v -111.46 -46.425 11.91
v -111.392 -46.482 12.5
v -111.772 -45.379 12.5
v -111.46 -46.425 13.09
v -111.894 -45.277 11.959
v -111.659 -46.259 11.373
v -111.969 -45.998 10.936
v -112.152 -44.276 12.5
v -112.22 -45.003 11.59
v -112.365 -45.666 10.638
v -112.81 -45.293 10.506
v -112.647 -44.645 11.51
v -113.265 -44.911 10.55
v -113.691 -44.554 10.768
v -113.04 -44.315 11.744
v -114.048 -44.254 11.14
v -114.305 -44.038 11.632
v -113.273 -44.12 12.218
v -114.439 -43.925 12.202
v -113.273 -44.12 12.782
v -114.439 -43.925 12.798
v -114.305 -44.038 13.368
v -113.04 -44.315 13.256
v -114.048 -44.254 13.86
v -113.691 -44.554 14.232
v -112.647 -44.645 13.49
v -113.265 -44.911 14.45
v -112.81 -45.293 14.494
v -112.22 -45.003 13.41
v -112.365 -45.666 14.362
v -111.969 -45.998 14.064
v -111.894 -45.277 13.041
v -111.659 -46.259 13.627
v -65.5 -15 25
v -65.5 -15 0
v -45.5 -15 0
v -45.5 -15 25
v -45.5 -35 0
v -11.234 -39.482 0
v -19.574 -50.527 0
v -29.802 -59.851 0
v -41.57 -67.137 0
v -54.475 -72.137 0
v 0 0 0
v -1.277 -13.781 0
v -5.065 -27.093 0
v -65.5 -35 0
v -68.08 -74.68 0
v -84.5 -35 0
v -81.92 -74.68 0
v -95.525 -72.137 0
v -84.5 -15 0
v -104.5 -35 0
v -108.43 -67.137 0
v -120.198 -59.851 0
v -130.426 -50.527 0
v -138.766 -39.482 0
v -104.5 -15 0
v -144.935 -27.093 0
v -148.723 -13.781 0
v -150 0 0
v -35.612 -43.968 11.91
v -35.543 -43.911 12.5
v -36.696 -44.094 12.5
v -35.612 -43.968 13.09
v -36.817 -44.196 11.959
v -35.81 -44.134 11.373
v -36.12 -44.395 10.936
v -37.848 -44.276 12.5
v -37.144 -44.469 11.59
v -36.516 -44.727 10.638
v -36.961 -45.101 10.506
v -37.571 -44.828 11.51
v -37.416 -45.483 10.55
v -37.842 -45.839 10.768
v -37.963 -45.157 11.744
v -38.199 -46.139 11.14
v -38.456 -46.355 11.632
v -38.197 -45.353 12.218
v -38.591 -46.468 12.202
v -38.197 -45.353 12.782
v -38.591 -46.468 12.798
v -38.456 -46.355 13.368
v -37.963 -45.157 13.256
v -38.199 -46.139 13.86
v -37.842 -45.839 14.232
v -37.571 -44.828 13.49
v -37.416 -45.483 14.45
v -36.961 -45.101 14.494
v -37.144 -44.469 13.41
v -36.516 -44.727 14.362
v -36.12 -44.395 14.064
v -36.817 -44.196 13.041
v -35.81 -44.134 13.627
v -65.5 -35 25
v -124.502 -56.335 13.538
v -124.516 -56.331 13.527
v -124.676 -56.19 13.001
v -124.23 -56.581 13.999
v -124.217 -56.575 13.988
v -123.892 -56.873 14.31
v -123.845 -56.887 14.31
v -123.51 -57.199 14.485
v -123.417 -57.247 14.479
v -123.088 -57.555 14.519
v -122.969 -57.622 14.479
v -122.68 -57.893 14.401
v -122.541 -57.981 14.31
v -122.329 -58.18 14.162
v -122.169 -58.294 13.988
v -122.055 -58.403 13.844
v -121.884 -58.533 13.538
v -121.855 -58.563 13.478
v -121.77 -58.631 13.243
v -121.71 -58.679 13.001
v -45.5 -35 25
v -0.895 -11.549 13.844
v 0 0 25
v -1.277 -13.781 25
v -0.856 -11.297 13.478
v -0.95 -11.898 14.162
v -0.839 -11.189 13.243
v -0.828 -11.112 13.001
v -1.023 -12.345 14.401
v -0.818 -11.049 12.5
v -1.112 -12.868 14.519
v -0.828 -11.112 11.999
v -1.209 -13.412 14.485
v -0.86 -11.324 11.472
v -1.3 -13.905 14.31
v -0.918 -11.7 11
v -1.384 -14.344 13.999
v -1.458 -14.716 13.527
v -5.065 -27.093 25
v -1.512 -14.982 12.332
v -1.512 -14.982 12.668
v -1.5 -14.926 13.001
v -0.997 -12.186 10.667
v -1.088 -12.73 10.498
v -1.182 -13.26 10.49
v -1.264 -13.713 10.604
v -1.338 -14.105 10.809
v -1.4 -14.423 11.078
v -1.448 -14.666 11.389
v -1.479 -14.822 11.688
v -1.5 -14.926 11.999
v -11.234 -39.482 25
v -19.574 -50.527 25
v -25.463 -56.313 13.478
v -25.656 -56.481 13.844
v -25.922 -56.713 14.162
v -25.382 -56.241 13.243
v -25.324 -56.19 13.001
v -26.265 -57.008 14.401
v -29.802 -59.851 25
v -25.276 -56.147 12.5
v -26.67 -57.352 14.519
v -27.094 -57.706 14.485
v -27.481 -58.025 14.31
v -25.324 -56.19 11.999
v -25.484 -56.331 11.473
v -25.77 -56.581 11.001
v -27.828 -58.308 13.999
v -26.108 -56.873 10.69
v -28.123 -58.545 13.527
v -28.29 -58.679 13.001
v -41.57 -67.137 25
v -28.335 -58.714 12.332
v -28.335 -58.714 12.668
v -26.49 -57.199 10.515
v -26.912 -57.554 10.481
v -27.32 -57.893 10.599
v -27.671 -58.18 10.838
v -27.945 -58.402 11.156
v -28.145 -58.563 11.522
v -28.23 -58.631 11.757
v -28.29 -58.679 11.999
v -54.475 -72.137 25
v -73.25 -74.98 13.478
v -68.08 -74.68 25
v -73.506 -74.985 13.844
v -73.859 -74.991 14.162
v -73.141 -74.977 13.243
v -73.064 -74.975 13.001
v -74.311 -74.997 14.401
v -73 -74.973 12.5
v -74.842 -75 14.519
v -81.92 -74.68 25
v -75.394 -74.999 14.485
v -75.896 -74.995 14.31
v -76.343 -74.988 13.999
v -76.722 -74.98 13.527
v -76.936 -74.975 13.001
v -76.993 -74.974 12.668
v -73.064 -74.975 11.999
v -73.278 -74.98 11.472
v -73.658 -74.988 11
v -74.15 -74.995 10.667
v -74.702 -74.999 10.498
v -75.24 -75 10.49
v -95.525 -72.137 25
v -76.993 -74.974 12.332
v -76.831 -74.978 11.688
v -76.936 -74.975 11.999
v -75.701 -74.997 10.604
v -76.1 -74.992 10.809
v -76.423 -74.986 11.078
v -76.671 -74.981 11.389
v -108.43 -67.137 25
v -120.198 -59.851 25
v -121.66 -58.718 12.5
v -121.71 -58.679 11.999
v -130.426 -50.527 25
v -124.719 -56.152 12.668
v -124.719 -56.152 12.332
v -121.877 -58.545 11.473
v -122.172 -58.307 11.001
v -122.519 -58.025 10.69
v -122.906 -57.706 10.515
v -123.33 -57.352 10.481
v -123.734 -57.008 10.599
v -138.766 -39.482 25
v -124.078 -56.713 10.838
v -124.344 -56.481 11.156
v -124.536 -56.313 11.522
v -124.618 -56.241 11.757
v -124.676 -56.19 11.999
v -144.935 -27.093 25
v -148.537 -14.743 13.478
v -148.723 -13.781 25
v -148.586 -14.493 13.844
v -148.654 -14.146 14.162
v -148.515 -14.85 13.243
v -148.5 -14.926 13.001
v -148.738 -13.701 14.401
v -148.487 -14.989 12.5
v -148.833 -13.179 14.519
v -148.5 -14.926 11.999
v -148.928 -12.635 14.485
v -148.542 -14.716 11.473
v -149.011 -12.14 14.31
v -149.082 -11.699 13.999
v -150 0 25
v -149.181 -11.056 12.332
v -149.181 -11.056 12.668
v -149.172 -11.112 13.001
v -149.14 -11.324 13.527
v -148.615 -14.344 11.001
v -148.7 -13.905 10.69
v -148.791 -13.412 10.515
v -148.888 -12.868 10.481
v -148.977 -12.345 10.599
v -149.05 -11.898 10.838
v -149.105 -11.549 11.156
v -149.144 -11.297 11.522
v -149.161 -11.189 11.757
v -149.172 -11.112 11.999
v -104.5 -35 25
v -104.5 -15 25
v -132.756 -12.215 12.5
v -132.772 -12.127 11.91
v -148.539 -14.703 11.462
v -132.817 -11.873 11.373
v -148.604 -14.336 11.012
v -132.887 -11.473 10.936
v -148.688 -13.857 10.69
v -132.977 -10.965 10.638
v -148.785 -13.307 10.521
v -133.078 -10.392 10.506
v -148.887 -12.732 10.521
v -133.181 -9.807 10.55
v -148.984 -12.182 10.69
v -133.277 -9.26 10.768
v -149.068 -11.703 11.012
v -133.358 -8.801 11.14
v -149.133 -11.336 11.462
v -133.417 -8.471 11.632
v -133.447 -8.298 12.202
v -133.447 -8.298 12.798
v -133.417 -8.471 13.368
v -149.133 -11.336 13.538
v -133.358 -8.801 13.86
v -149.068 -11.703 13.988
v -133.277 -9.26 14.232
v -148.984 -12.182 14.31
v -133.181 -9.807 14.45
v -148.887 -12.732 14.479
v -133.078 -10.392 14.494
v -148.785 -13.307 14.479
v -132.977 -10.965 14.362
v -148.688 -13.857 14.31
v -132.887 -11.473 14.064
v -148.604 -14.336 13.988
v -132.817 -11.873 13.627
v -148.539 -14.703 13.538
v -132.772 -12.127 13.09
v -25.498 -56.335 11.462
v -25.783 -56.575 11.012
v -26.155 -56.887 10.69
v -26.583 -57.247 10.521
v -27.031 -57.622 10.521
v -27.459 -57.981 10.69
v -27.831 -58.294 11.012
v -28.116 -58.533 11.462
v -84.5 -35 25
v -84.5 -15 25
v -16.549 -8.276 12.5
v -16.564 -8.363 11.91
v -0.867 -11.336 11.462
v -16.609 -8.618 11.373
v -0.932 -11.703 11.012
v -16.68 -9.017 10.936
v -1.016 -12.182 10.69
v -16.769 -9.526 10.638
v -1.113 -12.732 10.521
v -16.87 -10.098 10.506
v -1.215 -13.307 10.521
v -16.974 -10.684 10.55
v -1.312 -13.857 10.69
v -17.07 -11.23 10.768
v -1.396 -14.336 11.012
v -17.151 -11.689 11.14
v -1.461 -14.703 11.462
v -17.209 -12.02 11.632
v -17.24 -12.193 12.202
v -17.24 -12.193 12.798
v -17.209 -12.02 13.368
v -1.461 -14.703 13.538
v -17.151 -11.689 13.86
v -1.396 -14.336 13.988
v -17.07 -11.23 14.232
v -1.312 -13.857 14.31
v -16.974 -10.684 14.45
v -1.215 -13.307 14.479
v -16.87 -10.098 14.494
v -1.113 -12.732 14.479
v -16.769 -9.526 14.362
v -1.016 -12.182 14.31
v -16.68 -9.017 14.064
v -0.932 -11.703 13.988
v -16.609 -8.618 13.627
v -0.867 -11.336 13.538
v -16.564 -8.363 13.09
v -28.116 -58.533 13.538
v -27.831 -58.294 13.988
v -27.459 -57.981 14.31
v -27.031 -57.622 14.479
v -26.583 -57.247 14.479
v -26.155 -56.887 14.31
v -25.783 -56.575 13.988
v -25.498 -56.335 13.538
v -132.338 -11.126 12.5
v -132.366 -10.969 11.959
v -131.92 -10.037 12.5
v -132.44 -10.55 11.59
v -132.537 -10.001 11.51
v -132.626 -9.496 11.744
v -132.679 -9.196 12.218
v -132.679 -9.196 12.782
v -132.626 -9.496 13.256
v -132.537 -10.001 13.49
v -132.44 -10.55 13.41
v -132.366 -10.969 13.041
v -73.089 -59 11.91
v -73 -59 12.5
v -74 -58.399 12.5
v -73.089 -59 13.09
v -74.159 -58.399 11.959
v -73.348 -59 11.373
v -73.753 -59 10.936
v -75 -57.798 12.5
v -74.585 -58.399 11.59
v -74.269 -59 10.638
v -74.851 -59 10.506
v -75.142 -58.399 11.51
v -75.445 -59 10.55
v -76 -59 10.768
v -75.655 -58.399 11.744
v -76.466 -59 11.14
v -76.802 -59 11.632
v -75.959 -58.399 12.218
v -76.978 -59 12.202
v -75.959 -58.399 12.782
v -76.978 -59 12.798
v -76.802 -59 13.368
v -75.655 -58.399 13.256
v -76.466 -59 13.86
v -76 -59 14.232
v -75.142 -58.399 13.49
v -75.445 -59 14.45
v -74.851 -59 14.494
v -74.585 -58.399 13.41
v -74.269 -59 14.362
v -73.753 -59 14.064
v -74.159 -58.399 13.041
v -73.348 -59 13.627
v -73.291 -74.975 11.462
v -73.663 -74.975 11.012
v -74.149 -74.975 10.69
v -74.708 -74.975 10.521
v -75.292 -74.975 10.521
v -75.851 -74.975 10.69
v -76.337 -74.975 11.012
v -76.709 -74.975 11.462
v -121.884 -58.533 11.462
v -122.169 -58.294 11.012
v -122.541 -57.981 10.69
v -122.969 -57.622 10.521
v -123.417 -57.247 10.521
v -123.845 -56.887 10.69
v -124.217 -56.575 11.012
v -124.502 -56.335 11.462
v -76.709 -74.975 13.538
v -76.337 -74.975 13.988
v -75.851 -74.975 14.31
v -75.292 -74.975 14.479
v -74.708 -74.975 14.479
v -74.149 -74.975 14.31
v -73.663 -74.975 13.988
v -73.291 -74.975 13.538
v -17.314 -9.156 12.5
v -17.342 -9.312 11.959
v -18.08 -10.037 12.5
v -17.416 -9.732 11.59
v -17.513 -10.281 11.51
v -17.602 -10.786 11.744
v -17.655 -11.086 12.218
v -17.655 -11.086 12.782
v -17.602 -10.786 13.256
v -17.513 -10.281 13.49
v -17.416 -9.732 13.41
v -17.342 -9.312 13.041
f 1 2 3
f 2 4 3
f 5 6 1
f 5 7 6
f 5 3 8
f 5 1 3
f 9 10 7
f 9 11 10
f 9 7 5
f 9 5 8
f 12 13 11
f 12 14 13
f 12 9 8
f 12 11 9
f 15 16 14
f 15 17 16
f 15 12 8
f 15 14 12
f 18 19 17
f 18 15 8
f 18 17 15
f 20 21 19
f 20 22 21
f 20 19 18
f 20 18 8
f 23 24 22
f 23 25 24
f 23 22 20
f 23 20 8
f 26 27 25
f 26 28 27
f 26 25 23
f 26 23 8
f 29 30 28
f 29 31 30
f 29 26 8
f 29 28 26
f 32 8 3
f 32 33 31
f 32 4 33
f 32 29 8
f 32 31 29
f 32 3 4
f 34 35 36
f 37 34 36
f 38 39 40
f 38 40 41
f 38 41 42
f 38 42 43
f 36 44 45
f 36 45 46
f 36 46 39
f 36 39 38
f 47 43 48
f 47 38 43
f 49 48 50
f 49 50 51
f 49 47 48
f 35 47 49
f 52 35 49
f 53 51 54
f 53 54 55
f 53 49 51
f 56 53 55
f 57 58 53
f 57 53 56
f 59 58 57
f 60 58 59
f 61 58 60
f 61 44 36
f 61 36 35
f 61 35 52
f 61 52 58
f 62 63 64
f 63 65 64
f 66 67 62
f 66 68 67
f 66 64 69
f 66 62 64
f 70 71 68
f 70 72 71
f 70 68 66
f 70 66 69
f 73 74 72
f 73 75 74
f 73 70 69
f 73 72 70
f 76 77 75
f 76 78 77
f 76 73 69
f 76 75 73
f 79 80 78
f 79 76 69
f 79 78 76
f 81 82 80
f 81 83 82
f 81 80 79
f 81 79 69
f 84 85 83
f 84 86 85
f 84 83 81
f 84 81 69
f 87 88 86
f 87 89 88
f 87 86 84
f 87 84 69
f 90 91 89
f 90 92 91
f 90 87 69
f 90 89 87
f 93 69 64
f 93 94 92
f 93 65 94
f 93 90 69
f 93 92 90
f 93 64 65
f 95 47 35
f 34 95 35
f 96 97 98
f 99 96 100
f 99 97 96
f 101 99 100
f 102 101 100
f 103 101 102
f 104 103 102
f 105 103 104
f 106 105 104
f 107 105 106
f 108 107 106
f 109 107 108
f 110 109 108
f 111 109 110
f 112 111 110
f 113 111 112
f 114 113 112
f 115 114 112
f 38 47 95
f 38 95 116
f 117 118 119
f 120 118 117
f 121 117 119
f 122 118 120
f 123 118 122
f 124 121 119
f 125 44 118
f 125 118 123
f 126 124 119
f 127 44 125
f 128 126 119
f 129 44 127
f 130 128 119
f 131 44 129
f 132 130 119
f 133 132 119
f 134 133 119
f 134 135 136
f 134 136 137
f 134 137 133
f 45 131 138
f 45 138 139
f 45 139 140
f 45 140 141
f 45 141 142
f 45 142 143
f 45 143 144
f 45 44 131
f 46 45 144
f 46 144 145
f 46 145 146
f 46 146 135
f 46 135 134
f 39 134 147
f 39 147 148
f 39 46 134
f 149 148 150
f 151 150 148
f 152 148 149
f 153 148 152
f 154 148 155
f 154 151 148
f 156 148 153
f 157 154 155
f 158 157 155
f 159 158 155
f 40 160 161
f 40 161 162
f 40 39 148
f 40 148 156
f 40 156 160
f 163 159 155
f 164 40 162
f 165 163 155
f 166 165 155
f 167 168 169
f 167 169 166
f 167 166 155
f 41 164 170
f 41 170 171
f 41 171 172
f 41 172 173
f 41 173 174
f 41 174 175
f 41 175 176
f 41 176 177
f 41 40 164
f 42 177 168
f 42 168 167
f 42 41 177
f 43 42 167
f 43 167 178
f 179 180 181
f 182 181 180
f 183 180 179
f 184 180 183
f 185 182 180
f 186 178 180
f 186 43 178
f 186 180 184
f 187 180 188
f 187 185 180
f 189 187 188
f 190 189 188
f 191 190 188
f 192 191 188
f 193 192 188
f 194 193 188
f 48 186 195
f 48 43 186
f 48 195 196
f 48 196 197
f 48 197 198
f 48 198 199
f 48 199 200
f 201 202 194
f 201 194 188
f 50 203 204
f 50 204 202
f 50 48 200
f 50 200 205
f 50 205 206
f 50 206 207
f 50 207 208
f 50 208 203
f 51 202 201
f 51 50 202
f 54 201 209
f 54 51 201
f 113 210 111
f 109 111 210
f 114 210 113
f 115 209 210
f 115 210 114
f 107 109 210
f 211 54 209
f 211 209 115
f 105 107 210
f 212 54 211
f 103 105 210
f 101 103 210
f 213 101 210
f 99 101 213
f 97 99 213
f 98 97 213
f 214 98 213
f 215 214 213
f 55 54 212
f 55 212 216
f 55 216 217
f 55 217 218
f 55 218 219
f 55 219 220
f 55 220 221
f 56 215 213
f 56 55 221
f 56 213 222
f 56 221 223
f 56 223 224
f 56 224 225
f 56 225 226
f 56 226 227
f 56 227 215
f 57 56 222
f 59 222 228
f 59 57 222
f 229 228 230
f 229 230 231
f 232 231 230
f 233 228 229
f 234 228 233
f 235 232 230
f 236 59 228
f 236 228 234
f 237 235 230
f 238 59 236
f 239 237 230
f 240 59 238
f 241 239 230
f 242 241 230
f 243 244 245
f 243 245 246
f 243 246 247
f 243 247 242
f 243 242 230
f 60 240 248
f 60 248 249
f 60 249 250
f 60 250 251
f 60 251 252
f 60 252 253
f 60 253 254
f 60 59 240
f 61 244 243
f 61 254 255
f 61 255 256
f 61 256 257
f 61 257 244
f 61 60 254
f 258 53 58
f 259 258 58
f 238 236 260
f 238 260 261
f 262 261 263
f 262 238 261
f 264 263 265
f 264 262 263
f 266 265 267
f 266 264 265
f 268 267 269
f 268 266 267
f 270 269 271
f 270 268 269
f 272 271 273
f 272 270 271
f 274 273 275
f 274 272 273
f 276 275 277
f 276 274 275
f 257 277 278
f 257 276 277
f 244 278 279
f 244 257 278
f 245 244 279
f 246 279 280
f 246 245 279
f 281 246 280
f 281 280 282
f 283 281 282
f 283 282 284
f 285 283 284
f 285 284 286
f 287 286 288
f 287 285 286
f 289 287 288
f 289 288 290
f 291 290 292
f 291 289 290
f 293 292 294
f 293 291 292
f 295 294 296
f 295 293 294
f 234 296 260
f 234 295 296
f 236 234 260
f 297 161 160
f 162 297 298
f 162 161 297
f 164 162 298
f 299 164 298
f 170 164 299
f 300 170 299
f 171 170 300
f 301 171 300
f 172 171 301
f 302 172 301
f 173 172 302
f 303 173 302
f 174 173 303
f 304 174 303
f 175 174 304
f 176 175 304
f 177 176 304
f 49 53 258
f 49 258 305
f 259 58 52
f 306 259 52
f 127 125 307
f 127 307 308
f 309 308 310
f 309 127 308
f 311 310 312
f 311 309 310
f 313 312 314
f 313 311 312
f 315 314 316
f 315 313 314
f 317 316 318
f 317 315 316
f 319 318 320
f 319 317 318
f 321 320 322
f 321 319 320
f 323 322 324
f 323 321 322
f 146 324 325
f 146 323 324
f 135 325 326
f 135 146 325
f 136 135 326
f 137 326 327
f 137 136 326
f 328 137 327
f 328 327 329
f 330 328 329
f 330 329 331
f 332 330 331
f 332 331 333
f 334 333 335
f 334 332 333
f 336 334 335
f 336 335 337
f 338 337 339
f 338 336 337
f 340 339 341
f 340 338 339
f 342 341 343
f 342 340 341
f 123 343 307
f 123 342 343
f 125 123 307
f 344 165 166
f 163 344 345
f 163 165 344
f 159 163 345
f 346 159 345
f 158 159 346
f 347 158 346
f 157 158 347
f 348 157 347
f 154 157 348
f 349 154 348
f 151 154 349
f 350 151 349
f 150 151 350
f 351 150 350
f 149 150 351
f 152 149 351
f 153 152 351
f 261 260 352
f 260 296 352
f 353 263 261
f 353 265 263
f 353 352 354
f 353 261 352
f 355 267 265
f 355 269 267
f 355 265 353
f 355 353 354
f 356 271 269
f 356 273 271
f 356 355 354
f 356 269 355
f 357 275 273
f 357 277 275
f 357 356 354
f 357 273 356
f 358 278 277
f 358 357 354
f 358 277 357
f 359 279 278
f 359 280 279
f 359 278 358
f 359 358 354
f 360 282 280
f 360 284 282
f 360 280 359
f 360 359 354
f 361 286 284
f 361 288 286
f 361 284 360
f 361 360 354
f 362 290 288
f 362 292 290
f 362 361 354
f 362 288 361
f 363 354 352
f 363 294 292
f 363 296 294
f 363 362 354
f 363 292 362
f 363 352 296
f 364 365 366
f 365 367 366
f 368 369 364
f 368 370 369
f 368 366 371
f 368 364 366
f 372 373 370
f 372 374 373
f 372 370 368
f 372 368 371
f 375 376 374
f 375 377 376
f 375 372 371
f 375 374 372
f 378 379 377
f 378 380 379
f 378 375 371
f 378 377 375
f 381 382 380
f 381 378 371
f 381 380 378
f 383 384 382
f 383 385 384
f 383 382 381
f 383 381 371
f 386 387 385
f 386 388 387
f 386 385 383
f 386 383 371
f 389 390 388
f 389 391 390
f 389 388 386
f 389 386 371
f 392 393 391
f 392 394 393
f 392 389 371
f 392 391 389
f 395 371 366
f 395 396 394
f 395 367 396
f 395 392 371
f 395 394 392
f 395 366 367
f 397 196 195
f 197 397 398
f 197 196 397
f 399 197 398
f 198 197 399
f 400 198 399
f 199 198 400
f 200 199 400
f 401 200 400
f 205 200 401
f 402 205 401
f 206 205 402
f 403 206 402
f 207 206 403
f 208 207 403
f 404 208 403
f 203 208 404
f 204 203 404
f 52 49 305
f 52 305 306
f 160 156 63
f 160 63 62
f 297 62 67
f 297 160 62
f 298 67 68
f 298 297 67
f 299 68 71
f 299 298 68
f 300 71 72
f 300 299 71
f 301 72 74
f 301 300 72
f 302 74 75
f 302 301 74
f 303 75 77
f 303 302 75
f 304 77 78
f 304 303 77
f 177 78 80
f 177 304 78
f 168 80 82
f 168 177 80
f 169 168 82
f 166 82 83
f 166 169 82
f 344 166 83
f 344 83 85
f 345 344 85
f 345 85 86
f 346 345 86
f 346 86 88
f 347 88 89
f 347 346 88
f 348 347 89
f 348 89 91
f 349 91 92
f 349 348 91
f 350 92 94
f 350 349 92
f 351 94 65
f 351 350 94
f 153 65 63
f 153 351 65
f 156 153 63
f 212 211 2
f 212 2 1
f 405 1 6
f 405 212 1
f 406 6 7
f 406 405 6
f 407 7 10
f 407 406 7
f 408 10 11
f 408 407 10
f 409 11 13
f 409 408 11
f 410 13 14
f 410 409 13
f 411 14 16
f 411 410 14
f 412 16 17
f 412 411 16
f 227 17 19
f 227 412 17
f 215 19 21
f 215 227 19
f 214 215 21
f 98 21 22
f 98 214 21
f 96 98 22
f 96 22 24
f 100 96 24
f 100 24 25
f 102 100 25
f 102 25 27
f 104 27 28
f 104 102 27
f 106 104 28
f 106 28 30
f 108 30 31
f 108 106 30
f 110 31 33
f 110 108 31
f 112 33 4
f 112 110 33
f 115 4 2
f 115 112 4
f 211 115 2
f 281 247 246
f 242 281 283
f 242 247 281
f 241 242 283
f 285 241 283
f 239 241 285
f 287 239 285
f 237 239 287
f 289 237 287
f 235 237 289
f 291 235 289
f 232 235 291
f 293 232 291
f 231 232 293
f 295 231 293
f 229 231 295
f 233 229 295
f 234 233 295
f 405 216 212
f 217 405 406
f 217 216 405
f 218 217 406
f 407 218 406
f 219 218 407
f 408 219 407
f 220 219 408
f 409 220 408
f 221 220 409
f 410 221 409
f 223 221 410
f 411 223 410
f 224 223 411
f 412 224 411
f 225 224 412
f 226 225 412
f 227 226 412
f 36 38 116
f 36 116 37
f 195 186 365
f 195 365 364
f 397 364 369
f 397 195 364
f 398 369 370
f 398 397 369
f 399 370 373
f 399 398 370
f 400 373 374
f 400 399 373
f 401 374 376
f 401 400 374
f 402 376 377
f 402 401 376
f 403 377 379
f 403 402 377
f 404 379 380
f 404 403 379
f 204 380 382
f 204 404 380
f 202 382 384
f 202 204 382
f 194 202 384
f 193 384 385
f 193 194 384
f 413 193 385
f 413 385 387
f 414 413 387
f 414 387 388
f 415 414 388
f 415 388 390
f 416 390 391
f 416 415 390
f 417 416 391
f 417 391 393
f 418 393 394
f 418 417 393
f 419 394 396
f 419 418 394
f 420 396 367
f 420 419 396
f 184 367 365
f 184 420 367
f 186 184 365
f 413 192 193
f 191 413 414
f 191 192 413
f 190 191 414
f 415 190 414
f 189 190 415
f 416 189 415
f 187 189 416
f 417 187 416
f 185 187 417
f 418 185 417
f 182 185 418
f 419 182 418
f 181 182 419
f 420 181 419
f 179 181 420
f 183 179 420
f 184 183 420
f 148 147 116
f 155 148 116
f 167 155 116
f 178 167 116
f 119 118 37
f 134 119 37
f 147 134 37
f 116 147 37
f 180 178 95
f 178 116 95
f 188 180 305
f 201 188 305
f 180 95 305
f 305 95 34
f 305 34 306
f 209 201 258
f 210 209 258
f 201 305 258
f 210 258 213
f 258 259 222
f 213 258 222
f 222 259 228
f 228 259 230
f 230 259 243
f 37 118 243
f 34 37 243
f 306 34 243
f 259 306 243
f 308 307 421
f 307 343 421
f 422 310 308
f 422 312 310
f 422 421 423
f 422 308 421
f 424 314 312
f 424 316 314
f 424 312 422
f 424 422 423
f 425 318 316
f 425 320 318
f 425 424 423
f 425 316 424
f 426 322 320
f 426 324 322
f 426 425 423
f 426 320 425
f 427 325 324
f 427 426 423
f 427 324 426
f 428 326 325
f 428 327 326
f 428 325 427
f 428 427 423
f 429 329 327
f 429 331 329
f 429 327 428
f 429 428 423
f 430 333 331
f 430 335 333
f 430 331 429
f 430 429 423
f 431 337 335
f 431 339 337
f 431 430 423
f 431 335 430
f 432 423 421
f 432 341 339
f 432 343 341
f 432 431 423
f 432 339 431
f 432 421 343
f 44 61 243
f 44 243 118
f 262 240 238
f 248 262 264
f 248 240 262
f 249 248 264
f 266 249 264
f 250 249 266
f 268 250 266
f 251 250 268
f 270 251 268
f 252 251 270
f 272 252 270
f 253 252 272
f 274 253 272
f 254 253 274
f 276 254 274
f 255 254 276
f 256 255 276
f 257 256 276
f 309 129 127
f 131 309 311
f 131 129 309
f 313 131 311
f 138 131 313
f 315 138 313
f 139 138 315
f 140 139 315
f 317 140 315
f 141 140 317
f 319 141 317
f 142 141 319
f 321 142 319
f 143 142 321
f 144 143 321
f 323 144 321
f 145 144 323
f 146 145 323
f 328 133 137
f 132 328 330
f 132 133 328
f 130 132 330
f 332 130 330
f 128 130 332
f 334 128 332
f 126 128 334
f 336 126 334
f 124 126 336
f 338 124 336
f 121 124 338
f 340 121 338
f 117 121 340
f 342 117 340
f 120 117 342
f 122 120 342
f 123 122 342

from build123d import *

# Parameters (mm, degrees)
SKETCH1_W           = 20
SKETCH1_H           = 20
BOSS_EXTRUDE1_DEPTH = 25
CIRPATTERN1_COUNT   = 5
CIRPATTERN1_ANGLE   = 160


with BuildPart() as part:
    # Sketch1 → Boss-Extrude1 (new body)
    with BuildSketch(Plane.XY):
        with BuildLine():
            Line((-150, 0), (0, 0))
            ThreePointArc((0, 0), (-75, -75), (-150, 0))
        make_face()
        with Locations((-55.5, -25)):
            Rectangle(SKETCH1_W, SKETCH1_H, mode=Mode.SUBTRACT)
        with Locations((-94.5, -25)):
            Rectangle(SKETCH1_W, SKETCH1_H, mode=Mode.SUBTRACT)
    extrude(amount=BOSS_EXTRUDE1_DEPTH)

    # Sketch4 → Ø4.0mm Dowel Hole2 (revolve, cut)
    with BuildSketch(Plane(origin=(-1.139418524, -13.023613325, 12.5), x_dir=(0.17364817766693047, 0.9848077530122081, 0), z_dir=(0, 0, 1))):
        Polygon((0, 0), (0, 17.201721238), (2, 16), (2, 0.025), (2.025, 0), align=None)
    f_4_0mm_dowel_hole2 = revolve(axis=Axis((5.114110708, -14.126279253, 12.5), (-0.9848077530122081, 0.17364817766693044, 0)), mode=Mode.SUBTRACT)

    # CirPattern1: Ø4.0mm Dowel Hole2 ×5 about axis
    cirpattern1_axis = Axis((-75, 0, 0), (0, 0, -1))
    for i in range(1, CIRPATTERN1_COUNT):
        add(f_4_0mm_dowel_hole2.rotate(cirpattern1_axis, i * CIRPATTERN1_ANGLE / (CIRPATTERN1_COUNT - 1)), mode=Mode.SUBTRACT)


solid = part.part
